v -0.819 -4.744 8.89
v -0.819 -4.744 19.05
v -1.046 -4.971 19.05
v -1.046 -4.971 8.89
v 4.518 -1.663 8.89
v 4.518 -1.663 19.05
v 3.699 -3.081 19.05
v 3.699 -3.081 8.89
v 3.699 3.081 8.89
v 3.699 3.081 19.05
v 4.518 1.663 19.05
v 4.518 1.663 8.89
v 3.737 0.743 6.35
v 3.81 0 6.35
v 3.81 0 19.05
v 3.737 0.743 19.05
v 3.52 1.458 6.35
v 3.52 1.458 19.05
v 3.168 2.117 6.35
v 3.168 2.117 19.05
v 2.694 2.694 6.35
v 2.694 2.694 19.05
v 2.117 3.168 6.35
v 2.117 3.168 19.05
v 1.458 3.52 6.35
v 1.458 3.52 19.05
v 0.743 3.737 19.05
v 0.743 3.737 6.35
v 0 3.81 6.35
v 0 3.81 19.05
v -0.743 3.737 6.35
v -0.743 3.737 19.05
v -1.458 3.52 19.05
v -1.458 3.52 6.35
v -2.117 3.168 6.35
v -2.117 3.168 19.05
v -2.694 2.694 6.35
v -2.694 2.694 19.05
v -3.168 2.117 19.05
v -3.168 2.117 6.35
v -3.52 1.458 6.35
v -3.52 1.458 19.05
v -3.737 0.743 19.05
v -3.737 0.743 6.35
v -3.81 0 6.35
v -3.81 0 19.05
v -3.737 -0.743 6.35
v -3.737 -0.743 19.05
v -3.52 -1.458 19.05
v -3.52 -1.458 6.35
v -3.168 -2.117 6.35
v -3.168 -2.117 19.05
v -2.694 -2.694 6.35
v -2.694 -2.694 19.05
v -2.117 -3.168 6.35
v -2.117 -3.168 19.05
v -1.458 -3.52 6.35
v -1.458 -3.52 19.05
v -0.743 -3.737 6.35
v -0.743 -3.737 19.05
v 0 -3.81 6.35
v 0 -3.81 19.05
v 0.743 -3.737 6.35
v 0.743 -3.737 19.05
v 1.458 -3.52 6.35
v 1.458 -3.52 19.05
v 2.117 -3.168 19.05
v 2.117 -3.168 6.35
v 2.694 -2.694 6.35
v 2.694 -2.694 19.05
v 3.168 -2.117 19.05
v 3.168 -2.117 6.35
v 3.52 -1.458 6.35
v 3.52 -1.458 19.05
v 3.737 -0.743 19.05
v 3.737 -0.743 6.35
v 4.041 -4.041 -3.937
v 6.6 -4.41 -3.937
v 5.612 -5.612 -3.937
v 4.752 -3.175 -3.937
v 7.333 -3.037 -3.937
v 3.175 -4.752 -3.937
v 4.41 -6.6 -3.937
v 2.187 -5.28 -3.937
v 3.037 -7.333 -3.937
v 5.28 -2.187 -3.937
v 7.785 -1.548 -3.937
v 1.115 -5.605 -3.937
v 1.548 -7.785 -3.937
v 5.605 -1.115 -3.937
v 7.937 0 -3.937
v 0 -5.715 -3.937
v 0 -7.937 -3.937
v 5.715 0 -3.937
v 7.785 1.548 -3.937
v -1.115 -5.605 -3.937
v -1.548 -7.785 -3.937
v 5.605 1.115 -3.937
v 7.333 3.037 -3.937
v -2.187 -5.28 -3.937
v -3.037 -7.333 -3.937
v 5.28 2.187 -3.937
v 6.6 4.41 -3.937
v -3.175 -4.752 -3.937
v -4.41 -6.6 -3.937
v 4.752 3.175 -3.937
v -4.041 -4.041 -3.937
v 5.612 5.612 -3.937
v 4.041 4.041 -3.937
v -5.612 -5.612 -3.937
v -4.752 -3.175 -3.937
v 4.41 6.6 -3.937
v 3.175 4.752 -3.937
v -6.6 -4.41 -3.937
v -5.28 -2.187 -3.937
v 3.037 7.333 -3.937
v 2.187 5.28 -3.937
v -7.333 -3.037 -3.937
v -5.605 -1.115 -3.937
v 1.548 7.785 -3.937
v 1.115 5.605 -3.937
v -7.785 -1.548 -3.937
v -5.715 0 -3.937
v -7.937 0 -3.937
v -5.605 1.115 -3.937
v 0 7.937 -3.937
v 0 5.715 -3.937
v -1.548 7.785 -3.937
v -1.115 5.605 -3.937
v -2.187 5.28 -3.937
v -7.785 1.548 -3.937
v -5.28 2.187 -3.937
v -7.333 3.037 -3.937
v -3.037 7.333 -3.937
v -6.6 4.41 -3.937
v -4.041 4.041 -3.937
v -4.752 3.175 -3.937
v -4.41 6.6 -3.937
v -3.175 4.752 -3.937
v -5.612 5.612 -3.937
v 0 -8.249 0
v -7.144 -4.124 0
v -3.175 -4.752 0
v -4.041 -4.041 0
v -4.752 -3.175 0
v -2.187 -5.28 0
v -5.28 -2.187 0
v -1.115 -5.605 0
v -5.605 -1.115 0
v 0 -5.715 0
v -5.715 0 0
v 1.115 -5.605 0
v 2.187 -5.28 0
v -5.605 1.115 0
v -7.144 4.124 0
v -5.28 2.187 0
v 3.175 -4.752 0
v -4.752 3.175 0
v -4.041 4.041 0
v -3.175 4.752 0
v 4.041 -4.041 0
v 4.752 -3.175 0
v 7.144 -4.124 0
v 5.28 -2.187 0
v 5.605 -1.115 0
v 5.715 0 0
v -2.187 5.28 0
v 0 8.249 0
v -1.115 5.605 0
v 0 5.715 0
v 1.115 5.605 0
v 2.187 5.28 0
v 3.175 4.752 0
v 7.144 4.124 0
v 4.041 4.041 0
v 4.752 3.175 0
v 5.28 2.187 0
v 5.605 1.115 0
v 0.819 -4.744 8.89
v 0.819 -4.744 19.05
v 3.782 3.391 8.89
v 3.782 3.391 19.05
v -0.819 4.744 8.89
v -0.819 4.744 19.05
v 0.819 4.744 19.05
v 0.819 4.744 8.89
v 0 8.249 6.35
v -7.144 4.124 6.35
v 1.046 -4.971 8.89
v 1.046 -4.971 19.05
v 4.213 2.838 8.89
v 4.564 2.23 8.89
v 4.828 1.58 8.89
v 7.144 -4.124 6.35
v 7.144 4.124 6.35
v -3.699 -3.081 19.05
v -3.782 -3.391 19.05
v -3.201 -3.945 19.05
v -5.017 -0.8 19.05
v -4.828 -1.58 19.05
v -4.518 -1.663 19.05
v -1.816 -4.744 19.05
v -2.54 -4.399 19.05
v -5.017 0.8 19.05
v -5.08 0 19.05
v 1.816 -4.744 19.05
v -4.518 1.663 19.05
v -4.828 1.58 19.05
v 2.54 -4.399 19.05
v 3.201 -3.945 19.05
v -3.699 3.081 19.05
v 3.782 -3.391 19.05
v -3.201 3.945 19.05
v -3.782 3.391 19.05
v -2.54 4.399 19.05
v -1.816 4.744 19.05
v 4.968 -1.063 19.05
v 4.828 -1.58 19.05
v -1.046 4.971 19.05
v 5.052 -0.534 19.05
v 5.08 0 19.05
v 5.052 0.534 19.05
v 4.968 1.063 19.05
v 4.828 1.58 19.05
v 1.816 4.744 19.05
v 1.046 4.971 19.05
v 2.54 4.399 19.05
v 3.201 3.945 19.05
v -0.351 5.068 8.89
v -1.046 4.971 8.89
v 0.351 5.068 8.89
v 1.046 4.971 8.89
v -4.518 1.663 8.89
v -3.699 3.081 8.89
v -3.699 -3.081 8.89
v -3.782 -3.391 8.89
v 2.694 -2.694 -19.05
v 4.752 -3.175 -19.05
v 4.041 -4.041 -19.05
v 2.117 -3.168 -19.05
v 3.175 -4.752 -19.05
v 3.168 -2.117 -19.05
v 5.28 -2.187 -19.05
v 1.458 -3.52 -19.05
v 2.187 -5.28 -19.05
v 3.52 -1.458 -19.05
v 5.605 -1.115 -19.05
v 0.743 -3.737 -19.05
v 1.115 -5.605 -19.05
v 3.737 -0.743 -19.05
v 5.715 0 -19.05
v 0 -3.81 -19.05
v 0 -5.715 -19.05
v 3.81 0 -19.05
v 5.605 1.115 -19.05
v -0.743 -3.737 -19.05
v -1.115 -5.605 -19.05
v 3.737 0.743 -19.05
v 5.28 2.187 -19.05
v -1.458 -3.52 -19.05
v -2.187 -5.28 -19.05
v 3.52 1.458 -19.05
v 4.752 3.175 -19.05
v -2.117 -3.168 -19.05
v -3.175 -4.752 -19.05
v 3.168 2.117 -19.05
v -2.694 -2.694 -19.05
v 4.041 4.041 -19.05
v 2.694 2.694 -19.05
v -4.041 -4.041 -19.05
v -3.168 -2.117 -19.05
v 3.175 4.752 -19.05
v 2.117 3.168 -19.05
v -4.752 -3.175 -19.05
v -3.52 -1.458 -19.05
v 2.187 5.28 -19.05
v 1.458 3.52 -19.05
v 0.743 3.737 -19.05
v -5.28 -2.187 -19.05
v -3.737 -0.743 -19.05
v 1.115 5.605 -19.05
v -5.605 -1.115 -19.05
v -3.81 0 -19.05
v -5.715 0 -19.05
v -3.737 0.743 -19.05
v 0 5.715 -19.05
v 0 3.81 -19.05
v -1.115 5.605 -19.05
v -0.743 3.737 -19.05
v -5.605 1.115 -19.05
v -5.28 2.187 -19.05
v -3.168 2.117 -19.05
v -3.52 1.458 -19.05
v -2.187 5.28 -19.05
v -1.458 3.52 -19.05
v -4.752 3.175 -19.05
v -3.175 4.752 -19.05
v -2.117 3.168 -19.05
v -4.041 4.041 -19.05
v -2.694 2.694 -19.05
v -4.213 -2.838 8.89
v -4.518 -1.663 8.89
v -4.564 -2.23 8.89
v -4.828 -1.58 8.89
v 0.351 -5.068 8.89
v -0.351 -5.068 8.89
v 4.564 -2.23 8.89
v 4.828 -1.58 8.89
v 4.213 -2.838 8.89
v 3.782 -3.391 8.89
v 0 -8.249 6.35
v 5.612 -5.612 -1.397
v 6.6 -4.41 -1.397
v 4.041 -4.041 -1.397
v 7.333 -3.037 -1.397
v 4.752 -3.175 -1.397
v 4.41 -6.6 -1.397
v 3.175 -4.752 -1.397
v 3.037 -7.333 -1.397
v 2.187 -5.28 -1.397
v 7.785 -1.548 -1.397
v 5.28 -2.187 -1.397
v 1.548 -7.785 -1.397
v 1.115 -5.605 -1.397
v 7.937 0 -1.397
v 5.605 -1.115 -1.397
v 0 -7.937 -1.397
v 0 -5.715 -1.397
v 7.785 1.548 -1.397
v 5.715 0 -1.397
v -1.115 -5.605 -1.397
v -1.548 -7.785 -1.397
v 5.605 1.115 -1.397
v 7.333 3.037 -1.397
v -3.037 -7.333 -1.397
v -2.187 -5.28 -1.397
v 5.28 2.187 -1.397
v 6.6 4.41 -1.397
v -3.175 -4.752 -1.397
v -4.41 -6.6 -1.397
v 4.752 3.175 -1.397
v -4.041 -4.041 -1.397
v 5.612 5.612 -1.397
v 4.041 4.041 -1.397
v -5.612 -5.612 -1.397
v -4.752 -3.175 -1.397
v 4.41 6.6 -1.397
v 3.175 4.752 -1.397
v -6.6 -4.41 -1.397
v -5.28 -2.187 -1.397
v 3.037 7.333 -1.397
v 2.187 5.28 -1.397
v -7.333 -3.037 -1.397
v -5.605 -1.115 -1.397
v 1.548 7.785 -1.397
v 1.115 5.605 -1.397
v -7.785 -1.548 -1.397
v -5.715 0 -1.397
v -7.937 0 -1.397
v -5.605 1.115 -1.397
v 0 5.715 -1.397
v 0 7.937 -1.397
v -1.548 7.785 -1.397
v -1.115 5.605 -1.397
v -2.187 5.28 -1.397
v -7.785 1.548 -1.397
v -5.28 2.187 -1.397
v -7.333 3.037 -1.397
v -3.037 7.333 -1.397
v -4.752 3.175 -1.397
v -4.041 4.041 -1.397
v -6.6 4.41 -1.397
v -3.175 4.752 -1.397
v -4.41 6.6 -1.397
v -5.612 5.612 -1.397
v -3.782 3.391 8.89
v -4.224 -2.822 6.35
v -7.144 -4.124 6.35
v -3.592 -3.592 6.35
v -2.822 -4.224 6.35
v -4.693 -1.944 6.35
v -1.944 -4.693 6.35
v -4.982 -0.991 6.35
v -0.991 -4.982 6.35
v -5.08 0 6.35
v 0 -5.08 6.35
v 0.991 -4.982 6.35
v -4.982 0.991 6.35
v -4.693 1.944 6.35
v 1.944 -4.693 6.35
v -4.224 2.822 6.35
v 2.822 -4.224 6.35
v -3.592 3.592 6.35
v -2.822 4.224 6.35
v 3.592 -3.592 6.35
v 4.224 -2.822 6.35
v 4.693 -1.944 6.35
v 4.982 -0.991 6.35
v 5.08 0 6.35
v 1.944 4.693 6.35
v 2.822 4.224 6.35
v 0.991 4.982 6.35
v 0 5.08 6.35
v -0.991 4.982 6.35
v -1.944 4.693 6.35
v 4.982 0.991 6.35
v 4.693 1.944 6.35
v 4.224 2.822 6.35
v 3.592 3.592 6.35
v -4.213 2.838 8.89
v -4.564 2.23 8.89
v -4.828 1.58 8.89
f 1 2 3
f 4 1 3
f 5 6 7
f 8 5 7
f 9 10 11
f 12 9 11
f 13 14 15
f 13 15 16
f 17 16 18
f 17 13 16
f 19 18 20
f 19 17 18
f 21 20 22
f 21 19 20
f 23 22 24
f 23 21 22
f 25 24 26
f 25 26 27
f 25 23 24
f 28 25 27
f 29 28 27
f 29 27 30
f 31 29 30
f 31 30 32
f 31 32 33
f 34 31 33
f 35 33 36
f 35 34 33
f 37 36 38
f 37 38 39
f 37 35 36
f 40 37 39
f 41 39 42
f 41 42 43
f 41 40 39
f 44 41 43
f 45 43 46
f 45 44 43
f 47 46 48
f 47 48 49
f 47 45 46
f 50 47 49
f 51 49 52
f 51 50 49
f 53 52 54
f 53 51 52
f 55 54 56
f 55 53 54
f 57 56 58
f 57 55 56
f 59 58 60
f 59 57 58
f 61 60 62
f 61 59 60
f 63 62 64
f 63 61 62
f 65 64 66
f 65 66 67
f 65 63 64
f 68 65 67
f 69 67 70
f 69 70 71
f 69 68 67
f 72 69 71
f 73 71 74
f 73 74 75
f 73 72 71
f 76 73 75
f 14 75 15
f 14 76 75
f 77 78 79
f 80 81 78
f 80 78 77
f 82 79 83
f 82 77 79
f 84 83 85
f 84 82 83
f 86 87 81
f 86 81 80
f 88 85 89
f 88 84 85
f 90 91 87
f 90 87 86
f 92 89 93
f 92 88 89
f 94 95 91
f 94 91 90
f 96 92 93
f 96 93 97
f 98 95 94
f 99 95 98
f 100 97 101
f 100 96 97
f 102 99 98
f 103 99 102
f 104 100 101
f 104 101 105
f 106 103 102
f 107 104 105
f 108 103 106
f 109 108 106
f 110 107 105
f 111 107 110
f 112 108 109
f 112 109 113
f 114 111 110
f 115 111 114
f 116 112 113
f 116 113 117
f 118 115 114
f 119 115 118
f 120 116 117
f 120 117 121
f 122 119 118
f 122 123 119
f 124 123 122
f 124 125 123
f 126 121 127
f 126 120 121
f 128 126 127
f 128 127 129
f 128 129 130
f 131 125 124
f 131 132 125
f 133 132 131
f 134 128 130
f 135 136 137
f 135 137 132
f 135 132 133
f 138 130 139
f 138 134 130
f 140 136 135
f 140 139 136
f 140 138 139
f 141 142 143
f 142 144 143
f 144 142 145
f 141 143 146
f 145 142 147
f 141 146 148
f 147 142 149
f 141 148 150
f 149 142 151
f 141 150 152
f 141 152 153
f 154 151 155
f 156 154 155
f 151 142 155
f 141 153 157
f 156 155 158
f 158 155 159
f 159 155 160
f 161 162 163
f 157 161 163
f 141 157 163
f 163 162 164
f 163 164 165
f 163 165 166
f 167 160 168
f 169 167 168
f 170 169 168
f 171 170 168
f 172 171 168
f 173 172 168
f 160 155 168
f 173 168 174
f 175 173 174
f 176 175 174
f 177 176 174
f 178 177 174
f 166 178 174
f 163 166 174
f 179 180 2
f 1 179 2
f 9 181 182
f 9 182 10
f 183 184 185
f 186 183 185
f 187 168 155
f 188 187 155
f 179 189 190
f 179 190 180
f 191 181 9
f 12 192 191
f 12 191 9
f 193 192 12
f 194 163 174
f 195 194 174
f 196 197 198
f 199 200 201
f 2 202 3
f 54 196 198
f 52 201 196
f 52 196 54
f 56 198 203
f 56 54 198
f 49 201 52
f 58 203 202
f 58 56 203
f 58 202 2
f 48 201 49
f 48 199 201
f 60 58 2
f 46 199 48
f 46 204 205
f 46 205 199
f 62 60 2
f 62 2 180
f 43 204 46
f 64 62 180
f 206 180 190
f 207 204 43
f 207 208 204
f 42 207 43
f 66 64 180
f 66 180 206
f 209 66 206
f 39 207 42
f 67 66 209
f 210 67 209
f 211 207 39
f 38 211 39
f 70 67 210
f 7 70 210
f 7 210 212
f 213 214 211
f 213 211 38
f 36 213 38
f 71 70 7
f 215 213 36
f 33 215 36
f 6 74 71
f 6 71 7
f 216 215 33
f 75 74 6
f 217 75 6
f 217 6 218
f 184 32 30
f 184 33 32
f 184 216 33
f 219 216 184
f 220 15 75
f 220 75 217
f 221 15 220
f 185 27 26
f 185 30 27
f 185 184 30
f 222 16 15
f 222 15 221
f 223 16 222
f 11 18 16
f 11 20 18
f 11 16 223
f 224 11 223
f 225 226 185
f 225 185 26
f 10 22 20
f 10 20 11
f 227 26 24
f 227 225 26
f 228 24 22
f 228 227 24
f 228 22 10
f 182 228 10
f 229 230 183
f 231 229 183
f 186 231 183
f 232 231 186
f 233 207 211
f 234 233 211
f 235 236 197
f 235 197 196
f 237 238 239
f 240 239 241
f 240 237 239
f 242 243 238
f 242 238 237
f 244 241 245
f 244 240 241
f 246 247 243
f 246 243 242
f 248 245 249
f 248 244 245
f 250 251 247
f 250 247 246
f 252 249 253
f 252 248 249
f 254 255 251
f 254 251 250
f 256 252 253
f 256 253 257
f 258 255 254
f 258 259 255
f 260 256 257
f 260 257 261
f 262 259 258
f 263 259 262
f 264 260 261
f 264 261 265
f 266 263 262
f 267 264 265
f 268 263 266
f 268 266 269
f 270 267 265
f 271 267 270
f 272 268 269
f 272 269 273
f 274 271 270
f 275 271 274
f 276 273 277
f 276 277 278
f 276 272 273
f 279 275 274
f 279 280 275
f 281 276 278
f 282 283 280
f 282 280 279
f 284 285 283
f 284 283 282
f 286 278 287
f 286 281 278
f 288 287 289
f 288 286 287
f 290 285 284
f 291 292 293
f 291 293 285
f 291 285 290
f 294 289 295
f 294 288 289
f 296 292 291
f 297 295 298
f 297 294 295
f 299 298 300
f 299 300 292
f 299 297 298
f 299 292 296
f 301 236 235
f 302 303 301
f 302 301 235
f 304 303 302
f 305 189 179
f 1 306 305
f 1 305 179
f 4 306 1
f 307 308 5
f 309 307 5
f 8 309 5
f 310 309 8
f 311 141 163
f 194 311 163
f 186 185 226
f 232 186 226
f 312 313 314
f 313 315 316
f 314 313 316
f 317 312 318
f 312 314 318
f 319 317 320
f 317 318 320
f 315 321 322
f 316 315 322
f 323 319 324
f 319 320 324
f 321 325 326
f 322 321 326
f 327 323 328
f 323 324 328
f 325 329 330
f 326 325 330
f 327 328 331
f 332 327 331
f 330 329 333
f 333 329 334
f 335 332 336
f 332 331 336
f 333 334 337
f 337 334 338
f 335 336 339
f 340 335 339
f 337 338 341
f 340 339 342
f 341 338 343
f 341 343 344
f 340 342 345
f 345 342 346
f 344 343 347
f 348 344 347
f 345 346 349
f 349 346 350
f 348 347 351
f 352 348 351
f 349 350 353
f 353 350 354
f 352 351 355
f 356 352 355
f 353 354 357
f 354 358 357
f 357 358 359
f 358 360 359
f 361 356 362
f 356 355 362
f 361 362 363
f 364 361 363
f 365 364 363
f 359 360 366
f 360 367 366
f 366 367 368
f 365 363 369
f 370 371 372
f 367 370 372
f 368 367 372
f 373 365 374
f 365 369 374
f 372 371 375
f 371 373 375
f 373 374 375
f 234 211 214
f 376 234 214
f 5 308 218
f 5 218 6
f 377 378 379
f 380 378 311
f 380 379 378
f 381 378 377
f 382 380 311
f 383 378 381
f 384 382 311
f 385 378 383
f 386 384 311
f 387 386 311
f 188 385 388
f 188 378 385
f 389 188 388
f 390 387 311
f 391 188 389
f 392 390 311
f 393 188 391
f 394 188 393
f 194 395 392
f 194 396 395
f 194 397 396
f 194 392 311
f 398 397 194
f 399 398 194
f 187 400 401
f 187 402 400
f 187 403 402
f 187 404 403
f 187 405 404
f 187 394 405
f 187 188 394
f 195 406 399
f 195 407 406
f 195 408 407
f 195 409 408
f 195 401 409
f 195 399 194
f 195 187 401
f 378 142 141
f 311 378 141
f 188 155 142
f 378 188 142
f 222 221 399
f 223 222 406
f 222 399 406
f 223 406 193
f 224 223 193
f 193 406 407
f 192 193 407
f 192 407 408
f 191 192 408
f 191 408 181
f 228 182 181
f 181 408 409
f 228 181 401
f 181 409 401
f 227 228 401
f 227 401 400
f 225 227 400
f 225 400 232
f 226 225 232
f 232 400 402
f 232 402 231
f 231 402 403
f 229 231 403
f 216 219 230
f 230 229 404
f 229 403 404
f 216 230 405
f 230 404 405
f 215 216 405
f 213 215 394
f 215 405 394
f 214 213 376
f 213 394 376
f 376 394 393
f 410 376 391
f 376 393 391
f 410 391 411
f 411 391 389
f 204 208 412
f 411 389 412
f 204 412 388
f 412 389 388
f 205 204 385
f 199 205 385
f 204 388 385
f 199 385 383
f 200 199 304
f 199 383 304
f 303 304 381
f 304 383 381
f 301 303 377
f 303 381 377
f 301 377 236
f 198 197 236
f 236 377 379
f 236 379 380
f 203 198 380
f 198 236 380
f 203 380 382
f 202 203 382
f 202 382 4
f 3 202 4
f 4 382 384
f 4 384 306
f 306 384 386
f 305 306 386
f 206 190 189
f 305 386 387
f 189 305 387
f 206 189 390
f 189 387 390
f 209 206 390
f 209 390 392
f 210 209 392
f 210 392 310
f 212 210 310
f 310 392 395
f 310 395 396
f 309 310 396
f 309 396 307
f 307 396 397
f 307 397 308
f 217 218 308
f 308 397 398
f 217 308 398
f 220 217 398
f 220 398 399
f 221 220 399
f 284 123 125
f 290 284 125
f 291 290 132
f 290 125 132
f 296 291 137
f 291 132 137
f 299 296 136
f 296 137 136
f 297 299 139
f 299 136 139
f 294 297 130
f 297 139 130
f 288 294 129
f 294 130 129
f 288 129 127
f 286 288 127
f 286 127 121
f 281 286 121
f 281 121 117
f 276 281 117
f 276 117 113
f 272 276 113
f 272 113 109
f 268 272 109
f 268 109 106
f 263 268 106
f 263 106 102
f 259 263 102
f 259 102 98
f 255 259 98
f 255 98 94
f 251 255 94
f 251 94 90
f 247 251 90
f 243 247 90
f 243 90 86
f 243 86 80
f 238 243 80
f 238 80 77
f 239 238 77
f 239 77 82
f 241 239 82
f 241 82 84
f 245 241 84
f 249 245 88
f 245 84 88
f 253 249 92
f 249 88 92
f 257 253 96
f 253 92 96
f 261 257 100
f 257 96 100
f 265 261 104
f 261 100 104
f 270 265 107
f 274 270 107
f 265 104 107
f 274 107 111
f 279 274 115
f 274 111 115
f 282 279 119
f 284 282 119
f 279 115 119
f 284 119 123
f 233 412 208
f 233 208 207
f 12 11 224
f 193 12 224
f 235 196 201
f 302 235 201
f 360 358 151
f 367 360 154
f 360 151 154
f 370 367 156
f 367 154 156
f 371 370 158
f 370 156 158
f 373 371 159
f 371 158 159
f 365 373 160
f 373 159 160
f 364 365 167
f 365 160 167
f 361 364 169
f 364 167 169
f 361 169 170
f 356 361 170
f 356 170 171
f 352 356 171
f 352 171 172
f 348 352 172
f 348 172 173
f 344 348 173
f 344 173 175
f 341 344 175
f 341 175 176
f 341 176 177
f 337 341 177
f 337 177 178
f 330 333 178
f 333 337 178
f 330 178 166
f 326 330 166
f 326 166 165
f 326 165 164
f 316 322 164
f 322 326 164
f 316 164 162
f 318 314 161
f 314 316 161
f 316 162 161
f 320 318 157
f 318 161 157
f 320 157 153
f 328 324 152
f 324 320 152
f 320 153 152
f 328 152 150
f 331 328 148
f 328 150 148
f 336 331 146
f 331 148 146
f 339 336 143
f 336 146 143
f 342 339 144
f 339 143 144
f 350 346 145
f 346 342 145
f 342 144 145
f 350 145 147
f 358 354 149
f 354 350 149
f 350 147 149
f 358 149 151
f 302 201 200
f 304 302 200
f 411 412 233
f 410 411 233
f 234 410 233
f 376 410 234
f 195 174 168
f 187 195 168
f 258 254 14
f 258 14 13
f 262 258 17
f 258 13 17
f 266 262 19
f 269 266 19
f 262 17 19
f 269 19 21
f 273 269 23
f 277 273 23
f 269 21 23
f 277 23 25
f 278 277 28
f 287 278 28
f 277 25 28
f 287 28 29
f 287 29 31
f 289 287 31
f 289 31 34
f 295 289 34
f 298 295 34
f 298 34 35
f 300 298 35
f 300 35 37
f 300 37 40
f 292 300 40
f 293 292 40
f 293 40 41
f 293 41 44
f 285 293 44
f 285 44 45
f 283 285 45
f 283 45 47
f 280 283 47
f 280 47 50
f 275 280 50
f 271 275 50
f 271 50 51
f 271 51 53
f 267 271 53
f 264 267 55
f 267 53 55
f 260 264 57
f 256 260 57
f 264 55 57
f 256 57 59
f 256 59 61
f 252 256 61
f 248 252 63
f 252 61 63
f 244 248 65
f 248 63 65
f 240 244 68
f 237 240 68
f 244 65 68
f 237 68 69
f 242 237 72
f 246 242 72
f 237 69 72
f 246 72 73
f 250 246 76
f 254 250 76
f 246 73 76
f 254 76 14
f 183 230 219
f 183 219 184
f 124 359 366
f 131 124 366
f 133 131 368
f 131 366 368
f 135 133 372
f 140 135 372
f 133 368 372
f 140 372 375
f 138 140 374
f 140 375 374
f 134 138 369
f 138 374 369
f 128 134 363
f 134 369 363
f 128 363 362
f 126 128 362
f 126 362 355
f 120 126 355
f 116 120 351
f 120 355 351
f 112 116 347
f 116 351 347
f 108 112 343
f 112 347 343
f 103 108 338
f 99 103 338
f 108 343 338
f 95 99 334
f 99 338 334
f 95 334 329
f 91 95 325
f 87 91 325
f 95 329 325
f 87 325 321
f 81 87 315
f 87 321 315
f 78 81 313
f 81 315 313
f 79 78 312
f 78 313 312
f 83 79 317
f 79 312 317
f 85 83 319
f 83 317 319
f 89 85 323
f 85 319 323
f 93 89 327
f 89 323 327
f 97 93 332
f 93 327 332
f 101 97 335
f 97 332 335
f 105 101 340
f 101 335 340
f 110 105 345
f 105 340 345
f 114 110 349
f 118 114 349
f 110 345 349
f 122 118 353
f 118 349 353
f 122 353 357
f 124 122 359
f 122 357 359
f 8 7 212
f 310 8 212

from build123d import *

# Parameters (mm, degrees)
BOSS_EXTRUDE1_DEPTH = 6.35
SKETCH2_R           = 5.08
SKETCH2_R_2         = 3.81
BOSS_EXTRUDE2_DEPTH = 12.7
SKETCH3_R           = 5.715
BOSS_EXTRUDE3_DEPTH = 19.05
SKETCH4_R           = 7.937190451
BOSS_EXTRUDE4_DEPTH = 2.54
SKETCH5_R           = 3.81
CUT_EXTRUDE1_DEPTH  = 26.4
CUT_EXTRUDE2_DEPTH  = 10.16
CIRPATTERN1_COUNT   = 6


with BuildPart() as part:
    # Sketch1 → Boss-Extrude1 (new body)
    with BuildSketch(Plane.XY):
        Polygon((0, 8.248891971), (-7.14375, 4.124445986), (-7.14375, -4.124445986), (0, -8.248891971), (7.14375, -4.124445986), (7.14375, 4.124445986), align=None)
    extrude(amount=BOSS_EXTRUDE1_DEPTH)

    # Sketch2 → Boss-Extrude2 (add)
    with BuildSketch(Plane.XY.offset(6.35)):
        Circle(SKETCH2_R)
        Circle(SKETCH2_R_2, mode=Mode.SUBTRACT)
    extrude(amount=BOSS_EXTRUDE2_DEPTH)

    # Sketch3 → Boss-Extrude3 (add)
    with BuildSketch(Plane(origin=(0, 0, 0), x_dir=(-1, 0, 0), z_dir=(0, 0, -1))):
        Circle(SKETCH3_R)
    extrude(amount=BOSS_EXTRUDE3_DEPTH)

    # Sketch4 → Boss-Extrude4 (add)
    with BuildSketch(Plane(origin=(0, 0, -1.397), x_dir=(-1, 0, 0), z_dir=(0, 0, -1))):
        Circle(SKETCH4_R)
    extrude(amount=BOSS_EXTRUDE4_DEPTH)

    # Sketch5 → Cut-Extrude1 (cut, through all)
    with BuildSketch(Plane.XY.offset(6.35)):
        Circle(SKETCH5_R)
    extrude(amount=-CUT_EXTRUDE1_DEPTH, mode=Mode.SUBTRACT)

    # Sketch6 → Cut-Extrude2 (cut)
    with BuildSketch(Plane.XY.offset(19.05)):
        Polygon((-0.818654099, 4.743933512), (0.818654099, 4.743933512), (1.27, 5.195279413), (-1.27, 5.195279413), align=None)
    cut_extrude2 = extrude(amount=-CUT_EXTRUDE2_DEPTH, mode=Mode.SUBTRACT)

    # CirPattern1: Cut-Extrude2 ×6 about axis
    cirpattern1_axis = Axis((0, 0, 0), (0, 0, 1))
    for i in range(1, CIRPATTERN1_COUNT):
        add(cut_extrude2.rotate(cirpattern1_axis, i * 360 / CIRPATTERN1_COUNT), mode=Mode.SUBTRACT)


solid = part.part
